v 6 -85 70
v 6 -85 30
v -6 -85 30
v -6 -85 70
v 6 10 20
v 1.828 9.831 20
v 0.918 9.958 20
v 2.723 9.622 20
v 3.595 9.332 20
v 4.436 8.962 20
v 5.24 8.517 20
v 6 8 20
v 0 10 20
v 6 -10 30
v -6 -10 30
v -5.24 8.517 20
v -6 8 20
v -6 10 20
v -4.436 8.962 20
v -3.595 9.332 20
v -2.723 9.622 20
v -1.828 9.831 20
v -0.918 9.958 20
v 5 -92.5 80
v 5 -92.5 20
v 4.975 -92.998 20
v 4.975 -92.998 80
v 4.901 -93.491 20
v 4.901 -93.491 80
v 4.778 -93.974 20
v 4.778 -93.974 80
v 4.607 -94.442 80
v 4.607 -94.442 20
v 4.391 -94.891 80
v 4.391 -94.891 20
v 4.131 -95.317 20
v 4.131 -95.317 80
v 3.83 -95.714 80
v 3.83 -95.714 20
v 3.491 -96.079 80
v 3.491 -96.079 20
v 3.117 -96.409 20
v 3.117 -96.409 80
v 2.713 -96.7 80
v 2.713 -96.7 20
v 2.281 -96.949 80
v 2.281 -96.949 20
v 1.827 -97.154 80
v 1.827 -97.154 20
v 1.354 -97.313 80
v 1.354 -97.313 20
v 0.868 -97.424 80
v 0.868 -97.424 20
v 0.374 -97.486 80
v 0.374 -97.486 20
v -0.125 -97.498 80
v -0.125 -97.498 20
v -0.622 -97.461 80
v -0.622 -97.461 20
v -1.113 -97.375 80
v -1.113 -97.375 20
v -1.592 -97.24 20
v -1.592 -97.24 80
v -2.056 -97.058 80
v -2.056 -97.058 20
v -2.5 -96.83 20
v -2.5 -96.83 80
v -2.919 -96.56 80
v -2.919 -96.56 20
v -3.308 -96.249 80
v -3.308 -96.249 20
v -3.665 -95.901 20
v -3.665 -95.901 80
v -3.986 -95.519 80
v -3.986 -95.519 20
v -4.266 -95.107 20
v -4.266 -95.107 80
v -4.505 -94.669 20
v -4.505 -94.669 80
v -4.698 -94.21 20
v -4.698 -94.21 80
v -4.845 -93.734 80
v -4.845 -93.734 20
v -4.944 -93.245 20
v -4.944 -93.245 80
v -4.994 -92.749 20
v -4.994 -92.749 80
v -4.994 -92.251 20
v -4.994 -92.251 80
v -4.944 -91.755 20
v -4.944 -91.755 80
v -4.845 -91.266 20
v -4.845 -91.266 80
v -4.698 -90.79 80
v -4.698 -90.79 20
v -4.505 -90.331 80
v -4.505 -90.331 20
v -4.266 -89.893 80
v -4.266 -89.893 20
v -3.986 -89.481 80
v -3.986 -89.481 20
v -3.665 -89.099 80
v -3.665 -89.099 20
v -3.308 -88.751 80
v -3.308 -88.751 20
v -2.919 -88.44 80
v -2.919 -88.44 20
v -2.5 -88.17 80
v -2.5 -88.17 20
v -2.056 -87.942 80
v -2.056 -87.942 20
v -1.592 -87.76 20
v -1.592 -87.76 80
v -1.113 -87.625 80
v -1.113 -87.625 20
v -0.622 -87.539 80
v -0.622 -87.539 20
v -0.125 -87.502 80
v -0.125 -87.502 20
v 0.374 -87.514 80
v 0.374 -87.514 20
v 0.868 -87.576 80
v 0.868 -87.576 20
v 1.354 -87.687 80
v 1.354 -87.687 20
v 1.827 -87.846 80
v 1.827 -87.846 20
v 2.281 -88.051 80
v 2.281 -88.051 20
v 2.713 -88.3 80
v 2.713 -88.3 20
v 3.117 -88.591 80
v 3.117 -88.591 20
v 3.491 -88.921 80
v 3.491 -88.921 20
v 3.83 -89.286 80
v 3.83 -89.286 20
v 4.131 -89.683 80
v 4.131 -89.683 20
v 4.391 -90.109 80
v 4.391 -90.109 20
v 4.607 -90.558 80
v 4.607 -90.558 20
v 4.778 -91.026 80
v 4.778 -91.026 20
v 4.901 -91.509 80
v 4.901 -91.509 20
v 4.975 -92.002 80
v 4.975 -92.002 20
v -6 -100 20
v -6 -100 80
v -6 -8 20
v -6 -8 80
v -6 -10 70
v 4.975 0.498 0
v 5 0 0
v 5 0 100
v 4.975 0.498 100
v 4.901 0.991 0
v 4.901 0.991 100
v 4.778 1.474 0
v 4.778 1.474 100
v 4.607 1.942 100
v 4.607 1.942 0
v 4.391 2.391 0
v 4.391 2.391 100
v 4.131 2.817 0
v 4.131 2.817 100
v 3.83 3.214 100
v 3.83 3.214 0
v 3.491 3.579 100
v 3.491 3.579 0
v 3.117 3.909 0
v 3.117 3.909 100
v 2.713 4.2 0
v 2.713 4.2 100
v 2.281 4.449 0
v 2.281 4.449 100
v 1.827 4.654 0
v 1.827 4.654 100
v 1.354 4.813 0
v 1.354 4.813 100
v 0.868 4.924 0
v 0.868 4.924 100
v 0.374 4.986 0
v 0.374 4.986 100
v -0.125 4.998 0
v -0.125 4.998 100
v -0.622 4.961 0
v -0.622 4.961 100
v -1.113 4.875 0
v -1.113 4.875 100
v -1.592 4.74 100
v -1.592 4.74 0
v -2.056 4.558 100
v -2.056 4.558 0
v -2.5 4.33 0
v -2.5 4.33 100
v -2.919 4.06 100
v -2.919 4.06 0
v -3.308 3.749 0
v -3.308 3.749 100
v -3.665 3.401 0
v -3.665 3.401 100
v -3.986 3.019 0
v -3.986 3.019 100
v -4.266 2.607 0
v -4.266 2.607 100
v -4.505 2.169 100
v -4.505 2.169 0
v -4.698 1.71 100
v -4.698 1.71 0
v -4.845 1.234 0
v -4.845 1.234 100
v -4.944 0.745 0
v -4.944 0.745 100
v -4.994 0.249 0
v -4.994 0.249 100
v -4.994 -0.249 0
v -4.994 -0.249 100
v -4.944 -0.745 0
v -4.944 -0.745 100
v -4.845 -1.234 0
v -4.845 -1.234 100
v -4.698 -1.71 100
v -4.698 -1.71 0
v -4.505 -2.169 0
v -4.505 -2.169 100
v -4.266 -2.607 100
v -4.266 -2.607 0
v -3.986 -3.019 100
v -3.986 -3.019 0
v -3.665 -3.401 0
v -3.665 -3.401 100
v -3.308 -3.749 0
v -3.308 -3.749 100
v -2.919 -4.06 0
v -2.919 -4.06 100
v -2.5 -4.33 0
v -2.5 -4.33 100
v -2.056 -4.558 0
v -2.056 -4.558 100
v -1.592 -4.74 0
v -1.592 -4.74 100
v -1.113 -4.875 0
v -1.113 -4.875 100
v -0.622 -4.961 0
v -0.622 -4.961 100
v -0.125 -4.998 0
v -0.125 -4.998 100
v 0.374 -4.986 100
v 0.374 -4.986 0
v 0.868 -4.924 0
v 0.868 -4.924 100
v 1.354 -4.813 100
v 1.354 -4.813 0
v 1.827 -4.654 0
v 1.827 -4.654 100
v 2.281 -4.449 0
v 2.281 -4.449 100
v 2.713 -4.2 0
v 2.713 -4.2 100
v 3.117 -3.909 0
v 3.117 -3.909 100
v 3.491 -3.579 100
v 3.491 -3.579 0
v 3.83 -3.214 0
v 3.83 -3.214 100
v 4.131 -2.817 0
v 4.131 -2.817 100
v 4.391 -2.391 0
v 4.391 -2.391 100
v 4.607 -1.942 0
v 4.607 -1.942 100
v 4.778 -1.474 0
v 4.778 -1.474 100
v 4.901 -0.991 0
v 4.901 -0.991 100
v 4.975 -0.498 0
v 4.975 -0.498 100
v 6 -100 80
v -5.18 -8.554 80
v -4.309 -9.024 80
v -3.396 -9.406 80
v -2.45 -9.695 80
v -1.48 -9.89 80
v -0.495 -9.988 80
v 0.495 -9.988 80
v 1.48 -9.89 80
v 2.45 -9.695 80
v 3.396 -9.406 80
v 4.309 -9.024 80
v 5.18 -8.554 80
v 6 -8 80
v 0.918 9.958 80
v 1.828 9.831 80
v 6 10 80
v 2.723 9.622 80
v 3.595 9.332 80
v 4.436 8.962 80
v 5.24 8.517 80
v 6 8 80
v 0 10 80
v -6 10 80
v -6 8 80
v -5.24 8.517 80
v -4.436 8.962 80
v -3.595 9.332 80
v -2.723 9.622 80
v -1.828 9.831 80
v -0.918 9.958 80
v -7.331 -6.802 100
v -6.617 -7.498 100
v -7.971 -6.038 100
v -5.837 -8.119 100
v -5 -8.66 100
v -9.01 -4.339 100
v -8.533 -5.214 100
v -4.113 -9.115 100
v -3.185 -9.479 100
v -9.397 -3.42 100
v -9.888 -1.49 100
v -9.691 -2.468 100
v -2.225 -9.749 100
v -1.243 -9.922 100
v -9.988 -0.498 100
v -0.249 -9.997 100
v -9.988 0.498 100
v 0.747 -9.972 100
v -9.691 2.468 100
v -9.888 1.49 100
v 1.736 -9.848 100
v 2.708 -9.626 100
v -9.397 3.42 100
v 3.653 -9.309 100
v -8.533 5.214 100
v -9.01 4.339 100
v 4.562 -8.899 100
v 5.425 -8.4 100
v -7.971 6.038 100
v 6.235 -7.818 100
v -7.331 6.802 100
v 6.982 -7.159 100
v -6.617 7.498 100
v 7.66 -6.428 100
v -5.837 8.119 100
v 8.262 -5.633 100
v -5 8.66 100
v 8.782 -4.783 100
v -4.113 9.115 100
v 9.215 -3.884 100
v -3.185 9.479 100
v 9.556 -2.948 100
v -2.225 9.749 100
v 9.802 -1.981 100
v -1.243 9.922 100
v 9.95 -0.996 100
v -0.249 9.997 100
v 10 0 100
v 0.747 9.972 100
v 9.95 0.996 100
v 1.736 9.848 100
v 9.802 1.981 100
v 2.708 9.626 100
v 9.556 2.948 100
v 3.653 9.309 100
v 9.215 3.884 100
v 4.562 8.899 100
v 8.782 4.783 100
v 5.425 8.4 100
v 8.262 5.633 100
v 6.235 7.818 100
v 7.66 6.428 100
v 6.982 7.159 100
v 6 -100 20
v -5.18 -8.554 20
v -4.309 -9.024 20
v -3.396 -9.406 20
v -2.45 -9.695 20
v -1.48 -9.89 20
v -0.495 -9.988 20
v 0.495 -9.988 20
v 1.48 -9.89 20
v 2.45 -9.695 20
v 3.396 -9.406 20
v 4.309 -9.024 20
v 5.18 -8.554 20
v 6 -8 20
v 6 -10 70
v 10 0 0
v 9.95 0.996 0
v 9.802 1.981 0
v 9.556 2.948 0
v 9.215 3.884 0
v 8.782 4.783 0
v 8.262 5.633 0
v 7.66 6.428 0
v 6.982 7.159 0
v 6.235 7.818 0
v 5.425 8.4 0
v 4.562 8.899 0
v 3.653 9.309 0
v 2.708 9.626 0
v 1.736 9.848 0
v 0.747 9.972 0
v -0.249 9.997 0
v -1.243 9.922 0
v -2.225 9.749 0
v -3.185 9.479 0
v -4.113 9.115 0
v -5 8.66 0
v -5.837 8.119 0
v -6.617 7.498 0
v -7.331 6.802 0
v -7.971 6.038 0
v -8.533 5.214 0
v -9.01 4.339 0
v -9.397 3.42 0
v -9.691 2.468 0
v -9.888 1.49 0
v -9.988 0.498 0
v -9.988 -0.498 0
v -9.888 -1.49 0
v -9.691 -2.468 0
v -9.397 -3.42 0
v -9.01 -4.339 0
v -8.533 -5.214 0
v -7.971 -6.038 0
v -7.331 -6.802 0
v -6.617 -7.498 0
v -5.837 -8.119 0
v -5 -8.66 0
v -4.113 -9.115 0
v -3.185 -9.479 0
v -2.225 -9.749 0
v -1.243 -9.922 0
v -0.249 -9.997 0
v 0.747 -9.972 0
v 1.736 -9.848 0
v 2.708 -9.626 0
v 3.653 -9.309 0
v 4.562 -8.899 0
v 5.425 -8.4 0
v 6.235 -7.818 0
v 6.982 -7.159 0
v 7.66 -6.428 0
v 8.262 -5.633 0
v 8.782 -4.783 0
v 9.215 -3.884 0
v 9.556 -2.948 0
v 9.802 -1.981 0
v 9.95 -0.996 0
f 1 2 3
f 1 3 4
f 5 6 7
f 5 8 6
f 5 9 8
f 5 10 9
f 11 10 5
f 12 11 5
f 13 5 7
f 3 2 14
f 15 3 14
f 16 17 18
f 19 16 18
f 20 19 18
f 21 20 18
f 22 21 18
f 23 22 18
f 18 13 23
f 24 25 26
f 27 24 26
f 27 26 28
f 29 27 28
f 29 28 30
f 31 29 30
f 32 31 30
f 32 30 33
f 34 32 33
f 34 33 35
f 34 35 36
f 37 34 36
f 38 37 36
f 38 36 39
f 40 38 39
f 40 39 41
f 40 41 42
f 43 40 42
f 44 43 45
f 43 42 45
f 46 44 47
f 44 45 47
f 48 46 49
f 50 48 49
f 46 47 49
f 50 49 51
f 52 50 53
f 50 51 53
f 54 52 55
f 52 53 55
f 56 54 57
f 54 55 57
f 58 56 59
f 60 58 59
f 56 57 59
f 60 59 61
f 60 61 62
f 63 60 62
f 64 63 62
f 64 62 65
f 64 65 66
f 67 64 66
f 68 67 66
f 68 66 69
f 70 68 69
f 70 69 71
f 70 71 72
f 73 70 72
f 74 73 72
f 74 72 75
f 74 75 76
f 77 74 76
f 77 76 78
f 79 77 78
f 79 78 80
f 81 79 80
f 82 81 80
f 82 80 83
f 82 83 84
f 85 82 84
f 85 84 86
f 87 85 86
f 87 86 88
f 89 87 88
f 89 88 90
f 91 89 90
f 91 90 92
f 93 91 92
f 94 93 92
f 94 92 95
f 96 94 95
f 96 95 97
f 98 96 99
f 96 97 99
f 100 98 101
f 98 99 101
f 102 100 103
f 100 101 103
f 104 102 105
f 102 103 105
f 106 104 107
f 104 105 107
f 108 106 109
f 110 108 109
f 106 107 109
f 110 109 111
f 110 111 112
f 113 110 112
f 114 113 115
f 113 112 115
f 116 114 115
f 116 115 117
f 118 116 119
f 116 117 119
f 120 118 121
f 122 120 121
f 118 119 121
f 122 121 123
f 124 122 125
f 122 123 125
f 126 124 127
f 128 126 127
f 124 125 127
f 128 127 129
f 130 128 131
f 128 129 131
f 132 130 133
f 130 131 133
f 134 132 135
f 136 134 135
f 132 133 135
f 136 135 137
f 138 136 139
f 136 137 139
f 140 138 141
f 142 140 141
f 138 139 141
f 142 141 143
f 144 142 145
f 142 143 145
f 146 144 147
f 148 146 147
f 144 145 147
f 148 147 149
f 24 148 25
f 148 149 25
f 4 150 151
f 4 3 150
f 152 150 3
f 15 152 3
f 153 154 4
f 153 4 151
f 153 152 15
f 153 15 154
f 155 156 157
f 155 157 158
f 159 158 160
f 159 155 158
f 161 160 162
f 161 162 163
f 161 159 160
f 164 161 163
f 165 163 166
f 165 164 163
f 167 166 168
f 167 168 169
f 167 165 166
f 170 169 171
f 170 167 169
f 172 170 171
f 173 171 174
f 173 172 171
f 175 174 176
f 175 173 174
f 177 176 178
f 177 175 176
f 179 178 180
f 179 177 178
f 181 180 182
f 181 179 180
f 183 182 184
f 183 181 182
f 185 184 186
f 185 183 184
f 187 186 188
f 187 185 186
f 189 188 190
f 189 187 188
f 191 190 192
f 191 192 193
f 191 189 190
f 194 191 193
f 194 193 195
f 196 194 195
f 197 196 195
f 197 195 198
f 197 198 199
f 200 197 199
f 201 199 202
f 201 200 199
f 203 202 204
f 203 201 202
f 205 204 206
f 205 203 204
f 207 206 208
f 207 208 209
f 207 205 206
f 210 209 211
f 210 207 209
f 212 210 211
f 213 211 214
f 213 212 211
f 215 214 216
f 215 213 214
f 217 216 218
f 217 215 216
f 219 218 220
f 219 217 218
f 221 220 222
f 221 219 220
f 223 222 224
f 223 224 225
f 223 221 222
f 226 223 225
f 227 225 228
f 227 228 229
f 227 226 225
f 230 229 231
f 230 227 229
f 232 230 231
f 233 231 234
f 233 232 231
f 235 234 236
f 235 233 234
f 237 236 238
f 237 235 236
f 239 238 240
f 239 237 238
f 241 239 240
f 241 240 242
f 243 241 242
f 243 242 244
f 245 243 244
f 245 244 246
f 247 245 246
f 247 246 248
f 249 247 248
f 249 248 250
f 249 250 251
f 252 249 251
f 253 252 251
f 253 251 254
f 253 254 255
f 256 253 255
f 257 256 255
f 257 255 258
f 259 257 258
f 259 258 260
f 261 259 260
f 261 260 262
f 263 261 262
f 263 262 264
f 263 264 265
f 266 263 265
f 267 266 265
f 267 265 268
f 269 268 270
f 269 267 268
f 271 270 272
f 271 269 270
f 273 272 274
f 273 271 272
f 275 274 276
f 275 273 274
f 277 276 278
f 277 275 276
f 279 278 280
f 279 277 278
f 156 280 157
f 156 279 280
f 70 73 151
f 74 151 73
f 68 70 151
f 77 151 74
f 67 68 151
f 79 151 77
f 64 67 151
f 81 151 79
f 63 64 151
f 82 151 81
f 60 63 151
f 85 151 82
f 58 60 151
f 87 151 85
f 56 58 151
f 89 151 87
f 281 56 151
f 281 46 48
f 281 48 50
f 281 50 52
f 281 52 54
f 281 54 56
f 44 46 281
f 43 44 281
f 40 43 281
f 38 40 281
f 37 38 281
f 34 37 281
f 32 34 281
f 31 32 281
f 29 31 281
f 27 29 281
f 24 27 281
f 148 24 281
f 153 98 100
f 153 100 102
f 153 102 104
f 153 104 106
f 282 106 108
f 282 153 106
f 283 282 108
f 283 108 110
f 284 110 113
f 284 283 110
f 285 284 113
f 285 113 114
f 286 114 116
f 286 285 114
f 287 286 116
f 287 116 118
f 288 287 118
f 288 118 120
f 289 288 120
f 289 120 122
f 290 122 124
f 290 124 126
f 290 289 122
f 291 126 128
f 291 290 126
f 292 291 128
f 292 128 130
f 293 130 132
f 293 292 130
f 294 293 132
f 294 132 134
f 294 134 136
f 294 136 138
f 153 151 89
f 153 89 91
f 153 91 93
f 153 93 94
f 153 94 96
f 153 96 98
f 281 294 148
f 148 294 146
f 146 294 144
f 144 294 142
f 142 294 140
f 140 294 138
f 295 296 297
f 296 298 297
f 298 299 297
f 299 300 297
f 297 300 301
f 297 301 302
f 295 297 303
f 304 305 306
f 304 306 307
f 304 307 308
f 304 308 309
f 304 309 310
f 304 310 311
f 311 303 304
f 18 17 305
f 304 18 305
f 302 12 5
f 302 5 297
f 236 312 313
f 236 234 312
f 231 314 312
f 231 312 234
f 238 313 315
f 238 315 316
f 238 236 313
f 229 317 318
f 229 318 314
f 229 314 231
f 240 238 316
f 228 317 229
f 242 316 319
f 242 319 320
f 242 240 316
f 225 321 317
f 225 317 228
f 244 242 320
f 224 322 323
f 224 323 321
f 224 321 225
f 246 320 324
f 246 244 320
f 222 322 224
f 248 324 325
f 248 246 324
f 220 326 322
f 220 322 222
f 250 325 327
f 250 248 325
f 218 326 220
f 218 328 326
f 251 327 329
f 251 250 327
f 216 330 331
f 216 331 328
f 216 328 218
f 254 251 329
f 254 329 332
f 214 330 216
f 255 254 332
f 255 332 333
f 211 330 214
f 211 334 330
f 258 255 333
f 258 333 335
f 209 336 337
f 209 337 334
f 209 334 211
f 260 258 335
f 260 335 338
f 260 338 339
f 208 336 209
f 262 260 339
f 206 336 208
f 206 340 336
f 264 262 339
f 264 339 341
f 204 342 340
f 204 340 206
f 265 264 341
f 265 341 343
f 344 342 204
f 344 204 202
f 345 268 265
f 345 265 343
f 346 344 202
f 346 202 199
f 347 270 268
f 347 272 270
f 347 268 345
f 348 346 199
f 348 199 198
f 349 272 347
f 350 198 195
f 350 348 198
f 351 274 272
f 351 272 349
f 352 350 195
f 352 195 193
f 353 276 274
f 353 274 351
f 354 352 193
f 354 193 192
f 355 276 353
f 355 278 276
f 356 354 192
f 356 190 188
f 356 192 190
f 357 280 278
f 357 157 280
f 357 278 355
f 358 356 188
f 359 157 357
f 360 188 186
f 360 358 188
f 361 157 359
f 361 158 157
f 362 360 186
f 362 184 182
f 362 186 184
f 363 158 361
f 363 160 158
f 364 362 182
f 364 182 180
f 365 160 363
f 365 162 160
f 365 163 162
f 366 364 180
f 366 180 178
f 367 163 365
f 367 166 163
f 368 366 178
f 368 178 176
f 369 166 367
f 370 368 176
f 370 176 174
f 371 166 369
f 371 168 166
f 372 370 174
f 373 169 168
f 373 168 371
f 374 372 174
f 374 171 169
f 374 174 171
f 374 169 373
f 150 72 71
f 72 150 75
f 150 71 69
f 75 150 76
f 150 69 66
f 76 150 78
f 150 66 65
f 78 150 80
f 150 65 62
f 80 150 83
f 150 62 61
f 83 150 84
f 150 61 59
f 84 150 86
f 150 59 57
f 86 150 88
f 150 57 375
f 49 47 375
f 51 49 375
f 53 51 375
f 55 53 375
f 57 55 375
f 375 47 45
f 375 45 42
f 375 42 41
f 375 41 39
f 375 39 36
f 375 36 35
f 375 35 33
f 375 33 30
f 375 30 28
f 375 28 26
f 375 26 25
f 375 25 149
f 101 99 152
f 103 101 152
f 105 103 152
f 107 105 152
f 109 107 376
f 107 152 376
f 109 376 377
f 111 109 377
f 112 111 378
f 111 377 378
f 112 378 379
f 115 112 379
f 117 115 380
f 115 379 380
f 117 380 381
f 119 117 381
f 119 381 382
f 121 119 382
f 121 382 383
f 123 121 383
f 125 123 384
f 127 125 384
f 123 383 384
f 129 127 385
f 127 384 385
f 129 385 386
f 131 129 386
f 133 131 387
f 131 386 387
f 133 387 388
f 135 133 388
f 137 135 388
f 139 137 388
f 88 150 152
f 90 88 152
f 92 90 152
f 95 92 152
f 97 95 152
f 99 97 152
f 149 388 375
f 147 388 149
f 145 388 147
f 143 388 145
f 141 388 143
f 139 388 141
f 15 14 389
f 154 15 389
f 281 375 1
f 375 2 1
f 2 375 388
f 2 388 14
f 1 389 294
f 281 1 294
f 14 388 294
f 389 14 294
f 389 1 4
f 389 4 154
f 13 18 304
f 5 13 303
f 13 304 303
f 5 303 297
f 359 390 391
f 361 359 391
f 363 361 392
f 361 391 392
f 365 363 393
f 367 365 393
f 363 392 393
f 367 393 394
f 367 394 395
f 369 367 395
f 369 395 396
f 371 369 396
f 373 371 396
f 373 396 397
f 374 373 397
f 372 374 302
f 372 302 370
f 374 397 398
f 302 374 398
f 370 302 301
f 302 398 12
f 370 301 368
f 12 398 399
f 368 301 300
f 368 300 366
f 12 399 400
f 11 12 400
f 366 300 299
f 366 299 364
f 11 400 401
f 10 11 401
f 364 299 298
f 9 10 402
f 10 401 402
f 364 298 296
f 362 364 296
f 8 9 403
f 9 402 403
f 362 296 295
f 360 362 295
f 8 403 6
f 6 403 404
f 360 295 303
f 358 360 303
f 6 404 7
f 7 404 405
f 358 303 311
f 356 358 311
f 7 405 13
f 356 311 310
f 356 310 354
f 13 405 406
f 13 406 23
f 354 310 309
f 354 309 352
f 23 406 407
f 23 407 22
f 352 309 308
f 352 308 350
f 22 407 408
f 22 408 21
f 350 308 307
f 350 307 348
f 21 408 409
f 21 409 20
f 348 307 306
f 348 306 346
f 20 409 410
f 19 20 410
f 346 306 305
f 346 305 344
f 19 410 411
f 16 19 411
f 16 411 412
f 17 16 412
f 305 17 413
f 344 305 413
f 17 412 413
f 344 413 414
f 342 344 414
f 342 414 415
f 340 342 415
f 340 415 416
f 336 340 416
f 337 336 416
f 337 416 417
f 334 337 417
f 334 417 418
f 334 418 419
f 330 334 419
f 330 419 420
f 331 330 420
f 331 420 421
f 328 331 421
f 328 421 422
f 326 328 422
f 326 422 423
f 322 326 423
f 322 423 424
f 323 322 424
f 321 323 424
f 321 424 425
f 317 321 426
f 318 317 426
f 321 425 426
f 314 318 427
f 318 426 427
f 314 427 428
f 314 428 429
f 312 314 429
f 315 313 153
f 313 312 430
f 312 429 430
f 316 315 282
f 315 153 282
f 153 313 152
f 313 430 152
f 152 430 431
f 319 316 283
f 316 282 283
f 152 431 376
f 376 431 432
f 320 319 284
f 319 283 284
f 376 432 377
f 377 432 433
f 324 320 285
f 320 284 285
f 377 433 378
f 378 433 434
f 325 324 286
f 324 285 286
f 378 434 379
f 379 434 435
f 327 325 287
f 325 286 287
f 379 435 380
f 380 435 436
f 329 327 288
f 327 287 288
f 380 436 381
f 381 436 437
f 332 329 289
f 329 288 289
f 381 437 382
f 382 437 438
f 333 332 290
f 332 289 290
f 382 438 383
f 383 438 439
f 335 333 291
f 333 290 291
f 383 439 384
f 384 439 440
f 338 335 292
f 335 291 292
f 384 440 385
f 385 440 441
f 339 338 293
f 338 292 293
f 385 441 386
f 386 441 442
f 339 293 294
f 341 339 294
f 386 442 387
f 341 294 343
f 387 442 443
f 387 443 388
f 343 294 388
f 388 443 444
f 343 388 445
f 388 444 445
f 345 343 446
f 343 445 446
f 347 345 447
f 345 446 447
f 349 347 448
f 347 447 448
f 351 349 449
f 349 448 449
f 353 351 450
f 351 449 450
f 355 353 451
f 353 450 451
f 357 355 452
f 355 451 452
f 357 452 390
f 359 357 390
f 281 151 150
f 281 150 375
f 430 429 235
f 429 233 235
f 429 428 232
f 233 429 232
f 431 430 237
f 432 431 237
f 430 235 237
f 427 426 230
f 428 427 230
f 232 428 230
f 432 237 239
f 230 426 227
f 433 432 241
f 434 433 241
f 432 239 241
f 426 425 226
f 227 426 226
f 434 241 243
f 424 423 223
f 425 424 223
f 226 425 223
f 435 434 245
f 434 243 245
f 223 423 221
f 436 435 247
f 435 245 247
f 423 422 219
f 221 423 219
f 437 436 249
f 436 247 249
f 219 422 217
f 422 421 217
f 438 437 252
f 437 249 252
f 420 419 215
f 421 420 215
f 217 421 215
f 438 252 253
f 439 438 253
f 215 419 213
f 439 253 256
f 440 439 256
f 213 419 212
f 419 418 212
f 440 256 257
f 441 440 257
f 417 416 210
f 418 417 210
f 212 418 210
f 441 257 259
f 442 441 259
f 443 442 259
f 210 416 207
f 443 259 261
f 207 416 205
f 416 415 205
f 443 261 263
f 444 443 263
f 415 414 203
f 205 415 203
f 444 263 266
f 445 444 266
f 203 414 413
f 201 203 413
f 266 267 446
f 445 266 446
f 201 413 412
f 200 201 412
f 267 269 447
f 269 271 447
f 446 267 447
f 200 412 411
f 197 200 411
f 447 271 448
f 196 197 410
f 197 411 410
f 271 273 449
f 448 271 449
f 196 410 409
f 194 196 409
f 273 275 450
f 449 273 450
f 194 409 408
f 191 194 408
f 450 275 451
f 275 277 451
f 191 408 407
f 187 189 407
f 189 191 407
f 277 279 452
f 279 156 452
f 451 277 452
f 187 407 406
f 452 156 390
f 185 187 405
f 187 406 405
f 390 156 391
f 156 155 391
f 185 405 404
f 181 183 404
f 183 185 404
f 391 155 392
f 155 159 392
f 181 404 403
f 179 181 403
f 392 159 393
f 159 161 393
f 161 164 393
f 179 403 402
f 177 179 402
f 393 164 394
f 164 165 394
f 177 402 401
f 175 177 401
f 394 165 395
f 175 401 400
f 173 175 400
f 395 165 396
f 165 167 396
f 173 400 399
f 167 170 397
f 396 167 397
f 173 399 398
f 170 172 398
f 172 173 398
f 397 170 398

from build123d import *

# Parameters (mm, degrees)
F0_R          = 10
F1_DEPTH      = 100
F2_W          = 12
F2_H          = 60
F3_DEPTH      = 100
F3_DEPTH_BACK = 10
F4_W          = 75
F4_H          = 40
F5_DEPTH      = 12
F6_R          = 5
F7_DEPTH      = 100
F8_R          = 5
F9_DEPTH      = 80.001


with BuildPart() as f1:
    # F0 (on Top) → F1 (new body)
    with BuildSketch(Plane.XY):
        Circle(F0_R)
    extrude(amount=F1_DEPTH)

    # F2 (on Front) → F3 (join, two sides)
    with BuildSketch(Plane.XZ) as f3_sk:
        with Locations((0, 50)):
            Rectangle(F2_W, F2_H)
    extrude(amount=F3_DEPTH)
    extrude(f3_sk.sketch, amount=-F3_DEPTH_BACK)

    # F4 (on face) → F5 (cut, through all)
    with BuildSketch(Plane.YZ.offset(6)):
        with Locations((-47.5, 50)):
            Rectangle(F4_W, F4_H)
    extrude(amount=-F5_DEPTH, mode=Mode.SUBTRACT)

    # F6 (on Top) → F7 (cut, through all)
    with BuildSketch(Plane.XY):
        Circle(F6_R)
    extrude(amount=F7_DEPTH, mode=Mode.SUBTRACT)

    # F8 (on face) → F9 (cut, through all)
    with BuildSketch(Plane(origin=(0, 0, 20), x_dir=(1, 0, 0), z_dir=(0, 0, -1))):
        with Locations((0, 92.5)):
            Circle(F8_R)
    extrude(amount=-F9_DEPTH, mode=Mode.SUBTRACT)


solid = f1.part
